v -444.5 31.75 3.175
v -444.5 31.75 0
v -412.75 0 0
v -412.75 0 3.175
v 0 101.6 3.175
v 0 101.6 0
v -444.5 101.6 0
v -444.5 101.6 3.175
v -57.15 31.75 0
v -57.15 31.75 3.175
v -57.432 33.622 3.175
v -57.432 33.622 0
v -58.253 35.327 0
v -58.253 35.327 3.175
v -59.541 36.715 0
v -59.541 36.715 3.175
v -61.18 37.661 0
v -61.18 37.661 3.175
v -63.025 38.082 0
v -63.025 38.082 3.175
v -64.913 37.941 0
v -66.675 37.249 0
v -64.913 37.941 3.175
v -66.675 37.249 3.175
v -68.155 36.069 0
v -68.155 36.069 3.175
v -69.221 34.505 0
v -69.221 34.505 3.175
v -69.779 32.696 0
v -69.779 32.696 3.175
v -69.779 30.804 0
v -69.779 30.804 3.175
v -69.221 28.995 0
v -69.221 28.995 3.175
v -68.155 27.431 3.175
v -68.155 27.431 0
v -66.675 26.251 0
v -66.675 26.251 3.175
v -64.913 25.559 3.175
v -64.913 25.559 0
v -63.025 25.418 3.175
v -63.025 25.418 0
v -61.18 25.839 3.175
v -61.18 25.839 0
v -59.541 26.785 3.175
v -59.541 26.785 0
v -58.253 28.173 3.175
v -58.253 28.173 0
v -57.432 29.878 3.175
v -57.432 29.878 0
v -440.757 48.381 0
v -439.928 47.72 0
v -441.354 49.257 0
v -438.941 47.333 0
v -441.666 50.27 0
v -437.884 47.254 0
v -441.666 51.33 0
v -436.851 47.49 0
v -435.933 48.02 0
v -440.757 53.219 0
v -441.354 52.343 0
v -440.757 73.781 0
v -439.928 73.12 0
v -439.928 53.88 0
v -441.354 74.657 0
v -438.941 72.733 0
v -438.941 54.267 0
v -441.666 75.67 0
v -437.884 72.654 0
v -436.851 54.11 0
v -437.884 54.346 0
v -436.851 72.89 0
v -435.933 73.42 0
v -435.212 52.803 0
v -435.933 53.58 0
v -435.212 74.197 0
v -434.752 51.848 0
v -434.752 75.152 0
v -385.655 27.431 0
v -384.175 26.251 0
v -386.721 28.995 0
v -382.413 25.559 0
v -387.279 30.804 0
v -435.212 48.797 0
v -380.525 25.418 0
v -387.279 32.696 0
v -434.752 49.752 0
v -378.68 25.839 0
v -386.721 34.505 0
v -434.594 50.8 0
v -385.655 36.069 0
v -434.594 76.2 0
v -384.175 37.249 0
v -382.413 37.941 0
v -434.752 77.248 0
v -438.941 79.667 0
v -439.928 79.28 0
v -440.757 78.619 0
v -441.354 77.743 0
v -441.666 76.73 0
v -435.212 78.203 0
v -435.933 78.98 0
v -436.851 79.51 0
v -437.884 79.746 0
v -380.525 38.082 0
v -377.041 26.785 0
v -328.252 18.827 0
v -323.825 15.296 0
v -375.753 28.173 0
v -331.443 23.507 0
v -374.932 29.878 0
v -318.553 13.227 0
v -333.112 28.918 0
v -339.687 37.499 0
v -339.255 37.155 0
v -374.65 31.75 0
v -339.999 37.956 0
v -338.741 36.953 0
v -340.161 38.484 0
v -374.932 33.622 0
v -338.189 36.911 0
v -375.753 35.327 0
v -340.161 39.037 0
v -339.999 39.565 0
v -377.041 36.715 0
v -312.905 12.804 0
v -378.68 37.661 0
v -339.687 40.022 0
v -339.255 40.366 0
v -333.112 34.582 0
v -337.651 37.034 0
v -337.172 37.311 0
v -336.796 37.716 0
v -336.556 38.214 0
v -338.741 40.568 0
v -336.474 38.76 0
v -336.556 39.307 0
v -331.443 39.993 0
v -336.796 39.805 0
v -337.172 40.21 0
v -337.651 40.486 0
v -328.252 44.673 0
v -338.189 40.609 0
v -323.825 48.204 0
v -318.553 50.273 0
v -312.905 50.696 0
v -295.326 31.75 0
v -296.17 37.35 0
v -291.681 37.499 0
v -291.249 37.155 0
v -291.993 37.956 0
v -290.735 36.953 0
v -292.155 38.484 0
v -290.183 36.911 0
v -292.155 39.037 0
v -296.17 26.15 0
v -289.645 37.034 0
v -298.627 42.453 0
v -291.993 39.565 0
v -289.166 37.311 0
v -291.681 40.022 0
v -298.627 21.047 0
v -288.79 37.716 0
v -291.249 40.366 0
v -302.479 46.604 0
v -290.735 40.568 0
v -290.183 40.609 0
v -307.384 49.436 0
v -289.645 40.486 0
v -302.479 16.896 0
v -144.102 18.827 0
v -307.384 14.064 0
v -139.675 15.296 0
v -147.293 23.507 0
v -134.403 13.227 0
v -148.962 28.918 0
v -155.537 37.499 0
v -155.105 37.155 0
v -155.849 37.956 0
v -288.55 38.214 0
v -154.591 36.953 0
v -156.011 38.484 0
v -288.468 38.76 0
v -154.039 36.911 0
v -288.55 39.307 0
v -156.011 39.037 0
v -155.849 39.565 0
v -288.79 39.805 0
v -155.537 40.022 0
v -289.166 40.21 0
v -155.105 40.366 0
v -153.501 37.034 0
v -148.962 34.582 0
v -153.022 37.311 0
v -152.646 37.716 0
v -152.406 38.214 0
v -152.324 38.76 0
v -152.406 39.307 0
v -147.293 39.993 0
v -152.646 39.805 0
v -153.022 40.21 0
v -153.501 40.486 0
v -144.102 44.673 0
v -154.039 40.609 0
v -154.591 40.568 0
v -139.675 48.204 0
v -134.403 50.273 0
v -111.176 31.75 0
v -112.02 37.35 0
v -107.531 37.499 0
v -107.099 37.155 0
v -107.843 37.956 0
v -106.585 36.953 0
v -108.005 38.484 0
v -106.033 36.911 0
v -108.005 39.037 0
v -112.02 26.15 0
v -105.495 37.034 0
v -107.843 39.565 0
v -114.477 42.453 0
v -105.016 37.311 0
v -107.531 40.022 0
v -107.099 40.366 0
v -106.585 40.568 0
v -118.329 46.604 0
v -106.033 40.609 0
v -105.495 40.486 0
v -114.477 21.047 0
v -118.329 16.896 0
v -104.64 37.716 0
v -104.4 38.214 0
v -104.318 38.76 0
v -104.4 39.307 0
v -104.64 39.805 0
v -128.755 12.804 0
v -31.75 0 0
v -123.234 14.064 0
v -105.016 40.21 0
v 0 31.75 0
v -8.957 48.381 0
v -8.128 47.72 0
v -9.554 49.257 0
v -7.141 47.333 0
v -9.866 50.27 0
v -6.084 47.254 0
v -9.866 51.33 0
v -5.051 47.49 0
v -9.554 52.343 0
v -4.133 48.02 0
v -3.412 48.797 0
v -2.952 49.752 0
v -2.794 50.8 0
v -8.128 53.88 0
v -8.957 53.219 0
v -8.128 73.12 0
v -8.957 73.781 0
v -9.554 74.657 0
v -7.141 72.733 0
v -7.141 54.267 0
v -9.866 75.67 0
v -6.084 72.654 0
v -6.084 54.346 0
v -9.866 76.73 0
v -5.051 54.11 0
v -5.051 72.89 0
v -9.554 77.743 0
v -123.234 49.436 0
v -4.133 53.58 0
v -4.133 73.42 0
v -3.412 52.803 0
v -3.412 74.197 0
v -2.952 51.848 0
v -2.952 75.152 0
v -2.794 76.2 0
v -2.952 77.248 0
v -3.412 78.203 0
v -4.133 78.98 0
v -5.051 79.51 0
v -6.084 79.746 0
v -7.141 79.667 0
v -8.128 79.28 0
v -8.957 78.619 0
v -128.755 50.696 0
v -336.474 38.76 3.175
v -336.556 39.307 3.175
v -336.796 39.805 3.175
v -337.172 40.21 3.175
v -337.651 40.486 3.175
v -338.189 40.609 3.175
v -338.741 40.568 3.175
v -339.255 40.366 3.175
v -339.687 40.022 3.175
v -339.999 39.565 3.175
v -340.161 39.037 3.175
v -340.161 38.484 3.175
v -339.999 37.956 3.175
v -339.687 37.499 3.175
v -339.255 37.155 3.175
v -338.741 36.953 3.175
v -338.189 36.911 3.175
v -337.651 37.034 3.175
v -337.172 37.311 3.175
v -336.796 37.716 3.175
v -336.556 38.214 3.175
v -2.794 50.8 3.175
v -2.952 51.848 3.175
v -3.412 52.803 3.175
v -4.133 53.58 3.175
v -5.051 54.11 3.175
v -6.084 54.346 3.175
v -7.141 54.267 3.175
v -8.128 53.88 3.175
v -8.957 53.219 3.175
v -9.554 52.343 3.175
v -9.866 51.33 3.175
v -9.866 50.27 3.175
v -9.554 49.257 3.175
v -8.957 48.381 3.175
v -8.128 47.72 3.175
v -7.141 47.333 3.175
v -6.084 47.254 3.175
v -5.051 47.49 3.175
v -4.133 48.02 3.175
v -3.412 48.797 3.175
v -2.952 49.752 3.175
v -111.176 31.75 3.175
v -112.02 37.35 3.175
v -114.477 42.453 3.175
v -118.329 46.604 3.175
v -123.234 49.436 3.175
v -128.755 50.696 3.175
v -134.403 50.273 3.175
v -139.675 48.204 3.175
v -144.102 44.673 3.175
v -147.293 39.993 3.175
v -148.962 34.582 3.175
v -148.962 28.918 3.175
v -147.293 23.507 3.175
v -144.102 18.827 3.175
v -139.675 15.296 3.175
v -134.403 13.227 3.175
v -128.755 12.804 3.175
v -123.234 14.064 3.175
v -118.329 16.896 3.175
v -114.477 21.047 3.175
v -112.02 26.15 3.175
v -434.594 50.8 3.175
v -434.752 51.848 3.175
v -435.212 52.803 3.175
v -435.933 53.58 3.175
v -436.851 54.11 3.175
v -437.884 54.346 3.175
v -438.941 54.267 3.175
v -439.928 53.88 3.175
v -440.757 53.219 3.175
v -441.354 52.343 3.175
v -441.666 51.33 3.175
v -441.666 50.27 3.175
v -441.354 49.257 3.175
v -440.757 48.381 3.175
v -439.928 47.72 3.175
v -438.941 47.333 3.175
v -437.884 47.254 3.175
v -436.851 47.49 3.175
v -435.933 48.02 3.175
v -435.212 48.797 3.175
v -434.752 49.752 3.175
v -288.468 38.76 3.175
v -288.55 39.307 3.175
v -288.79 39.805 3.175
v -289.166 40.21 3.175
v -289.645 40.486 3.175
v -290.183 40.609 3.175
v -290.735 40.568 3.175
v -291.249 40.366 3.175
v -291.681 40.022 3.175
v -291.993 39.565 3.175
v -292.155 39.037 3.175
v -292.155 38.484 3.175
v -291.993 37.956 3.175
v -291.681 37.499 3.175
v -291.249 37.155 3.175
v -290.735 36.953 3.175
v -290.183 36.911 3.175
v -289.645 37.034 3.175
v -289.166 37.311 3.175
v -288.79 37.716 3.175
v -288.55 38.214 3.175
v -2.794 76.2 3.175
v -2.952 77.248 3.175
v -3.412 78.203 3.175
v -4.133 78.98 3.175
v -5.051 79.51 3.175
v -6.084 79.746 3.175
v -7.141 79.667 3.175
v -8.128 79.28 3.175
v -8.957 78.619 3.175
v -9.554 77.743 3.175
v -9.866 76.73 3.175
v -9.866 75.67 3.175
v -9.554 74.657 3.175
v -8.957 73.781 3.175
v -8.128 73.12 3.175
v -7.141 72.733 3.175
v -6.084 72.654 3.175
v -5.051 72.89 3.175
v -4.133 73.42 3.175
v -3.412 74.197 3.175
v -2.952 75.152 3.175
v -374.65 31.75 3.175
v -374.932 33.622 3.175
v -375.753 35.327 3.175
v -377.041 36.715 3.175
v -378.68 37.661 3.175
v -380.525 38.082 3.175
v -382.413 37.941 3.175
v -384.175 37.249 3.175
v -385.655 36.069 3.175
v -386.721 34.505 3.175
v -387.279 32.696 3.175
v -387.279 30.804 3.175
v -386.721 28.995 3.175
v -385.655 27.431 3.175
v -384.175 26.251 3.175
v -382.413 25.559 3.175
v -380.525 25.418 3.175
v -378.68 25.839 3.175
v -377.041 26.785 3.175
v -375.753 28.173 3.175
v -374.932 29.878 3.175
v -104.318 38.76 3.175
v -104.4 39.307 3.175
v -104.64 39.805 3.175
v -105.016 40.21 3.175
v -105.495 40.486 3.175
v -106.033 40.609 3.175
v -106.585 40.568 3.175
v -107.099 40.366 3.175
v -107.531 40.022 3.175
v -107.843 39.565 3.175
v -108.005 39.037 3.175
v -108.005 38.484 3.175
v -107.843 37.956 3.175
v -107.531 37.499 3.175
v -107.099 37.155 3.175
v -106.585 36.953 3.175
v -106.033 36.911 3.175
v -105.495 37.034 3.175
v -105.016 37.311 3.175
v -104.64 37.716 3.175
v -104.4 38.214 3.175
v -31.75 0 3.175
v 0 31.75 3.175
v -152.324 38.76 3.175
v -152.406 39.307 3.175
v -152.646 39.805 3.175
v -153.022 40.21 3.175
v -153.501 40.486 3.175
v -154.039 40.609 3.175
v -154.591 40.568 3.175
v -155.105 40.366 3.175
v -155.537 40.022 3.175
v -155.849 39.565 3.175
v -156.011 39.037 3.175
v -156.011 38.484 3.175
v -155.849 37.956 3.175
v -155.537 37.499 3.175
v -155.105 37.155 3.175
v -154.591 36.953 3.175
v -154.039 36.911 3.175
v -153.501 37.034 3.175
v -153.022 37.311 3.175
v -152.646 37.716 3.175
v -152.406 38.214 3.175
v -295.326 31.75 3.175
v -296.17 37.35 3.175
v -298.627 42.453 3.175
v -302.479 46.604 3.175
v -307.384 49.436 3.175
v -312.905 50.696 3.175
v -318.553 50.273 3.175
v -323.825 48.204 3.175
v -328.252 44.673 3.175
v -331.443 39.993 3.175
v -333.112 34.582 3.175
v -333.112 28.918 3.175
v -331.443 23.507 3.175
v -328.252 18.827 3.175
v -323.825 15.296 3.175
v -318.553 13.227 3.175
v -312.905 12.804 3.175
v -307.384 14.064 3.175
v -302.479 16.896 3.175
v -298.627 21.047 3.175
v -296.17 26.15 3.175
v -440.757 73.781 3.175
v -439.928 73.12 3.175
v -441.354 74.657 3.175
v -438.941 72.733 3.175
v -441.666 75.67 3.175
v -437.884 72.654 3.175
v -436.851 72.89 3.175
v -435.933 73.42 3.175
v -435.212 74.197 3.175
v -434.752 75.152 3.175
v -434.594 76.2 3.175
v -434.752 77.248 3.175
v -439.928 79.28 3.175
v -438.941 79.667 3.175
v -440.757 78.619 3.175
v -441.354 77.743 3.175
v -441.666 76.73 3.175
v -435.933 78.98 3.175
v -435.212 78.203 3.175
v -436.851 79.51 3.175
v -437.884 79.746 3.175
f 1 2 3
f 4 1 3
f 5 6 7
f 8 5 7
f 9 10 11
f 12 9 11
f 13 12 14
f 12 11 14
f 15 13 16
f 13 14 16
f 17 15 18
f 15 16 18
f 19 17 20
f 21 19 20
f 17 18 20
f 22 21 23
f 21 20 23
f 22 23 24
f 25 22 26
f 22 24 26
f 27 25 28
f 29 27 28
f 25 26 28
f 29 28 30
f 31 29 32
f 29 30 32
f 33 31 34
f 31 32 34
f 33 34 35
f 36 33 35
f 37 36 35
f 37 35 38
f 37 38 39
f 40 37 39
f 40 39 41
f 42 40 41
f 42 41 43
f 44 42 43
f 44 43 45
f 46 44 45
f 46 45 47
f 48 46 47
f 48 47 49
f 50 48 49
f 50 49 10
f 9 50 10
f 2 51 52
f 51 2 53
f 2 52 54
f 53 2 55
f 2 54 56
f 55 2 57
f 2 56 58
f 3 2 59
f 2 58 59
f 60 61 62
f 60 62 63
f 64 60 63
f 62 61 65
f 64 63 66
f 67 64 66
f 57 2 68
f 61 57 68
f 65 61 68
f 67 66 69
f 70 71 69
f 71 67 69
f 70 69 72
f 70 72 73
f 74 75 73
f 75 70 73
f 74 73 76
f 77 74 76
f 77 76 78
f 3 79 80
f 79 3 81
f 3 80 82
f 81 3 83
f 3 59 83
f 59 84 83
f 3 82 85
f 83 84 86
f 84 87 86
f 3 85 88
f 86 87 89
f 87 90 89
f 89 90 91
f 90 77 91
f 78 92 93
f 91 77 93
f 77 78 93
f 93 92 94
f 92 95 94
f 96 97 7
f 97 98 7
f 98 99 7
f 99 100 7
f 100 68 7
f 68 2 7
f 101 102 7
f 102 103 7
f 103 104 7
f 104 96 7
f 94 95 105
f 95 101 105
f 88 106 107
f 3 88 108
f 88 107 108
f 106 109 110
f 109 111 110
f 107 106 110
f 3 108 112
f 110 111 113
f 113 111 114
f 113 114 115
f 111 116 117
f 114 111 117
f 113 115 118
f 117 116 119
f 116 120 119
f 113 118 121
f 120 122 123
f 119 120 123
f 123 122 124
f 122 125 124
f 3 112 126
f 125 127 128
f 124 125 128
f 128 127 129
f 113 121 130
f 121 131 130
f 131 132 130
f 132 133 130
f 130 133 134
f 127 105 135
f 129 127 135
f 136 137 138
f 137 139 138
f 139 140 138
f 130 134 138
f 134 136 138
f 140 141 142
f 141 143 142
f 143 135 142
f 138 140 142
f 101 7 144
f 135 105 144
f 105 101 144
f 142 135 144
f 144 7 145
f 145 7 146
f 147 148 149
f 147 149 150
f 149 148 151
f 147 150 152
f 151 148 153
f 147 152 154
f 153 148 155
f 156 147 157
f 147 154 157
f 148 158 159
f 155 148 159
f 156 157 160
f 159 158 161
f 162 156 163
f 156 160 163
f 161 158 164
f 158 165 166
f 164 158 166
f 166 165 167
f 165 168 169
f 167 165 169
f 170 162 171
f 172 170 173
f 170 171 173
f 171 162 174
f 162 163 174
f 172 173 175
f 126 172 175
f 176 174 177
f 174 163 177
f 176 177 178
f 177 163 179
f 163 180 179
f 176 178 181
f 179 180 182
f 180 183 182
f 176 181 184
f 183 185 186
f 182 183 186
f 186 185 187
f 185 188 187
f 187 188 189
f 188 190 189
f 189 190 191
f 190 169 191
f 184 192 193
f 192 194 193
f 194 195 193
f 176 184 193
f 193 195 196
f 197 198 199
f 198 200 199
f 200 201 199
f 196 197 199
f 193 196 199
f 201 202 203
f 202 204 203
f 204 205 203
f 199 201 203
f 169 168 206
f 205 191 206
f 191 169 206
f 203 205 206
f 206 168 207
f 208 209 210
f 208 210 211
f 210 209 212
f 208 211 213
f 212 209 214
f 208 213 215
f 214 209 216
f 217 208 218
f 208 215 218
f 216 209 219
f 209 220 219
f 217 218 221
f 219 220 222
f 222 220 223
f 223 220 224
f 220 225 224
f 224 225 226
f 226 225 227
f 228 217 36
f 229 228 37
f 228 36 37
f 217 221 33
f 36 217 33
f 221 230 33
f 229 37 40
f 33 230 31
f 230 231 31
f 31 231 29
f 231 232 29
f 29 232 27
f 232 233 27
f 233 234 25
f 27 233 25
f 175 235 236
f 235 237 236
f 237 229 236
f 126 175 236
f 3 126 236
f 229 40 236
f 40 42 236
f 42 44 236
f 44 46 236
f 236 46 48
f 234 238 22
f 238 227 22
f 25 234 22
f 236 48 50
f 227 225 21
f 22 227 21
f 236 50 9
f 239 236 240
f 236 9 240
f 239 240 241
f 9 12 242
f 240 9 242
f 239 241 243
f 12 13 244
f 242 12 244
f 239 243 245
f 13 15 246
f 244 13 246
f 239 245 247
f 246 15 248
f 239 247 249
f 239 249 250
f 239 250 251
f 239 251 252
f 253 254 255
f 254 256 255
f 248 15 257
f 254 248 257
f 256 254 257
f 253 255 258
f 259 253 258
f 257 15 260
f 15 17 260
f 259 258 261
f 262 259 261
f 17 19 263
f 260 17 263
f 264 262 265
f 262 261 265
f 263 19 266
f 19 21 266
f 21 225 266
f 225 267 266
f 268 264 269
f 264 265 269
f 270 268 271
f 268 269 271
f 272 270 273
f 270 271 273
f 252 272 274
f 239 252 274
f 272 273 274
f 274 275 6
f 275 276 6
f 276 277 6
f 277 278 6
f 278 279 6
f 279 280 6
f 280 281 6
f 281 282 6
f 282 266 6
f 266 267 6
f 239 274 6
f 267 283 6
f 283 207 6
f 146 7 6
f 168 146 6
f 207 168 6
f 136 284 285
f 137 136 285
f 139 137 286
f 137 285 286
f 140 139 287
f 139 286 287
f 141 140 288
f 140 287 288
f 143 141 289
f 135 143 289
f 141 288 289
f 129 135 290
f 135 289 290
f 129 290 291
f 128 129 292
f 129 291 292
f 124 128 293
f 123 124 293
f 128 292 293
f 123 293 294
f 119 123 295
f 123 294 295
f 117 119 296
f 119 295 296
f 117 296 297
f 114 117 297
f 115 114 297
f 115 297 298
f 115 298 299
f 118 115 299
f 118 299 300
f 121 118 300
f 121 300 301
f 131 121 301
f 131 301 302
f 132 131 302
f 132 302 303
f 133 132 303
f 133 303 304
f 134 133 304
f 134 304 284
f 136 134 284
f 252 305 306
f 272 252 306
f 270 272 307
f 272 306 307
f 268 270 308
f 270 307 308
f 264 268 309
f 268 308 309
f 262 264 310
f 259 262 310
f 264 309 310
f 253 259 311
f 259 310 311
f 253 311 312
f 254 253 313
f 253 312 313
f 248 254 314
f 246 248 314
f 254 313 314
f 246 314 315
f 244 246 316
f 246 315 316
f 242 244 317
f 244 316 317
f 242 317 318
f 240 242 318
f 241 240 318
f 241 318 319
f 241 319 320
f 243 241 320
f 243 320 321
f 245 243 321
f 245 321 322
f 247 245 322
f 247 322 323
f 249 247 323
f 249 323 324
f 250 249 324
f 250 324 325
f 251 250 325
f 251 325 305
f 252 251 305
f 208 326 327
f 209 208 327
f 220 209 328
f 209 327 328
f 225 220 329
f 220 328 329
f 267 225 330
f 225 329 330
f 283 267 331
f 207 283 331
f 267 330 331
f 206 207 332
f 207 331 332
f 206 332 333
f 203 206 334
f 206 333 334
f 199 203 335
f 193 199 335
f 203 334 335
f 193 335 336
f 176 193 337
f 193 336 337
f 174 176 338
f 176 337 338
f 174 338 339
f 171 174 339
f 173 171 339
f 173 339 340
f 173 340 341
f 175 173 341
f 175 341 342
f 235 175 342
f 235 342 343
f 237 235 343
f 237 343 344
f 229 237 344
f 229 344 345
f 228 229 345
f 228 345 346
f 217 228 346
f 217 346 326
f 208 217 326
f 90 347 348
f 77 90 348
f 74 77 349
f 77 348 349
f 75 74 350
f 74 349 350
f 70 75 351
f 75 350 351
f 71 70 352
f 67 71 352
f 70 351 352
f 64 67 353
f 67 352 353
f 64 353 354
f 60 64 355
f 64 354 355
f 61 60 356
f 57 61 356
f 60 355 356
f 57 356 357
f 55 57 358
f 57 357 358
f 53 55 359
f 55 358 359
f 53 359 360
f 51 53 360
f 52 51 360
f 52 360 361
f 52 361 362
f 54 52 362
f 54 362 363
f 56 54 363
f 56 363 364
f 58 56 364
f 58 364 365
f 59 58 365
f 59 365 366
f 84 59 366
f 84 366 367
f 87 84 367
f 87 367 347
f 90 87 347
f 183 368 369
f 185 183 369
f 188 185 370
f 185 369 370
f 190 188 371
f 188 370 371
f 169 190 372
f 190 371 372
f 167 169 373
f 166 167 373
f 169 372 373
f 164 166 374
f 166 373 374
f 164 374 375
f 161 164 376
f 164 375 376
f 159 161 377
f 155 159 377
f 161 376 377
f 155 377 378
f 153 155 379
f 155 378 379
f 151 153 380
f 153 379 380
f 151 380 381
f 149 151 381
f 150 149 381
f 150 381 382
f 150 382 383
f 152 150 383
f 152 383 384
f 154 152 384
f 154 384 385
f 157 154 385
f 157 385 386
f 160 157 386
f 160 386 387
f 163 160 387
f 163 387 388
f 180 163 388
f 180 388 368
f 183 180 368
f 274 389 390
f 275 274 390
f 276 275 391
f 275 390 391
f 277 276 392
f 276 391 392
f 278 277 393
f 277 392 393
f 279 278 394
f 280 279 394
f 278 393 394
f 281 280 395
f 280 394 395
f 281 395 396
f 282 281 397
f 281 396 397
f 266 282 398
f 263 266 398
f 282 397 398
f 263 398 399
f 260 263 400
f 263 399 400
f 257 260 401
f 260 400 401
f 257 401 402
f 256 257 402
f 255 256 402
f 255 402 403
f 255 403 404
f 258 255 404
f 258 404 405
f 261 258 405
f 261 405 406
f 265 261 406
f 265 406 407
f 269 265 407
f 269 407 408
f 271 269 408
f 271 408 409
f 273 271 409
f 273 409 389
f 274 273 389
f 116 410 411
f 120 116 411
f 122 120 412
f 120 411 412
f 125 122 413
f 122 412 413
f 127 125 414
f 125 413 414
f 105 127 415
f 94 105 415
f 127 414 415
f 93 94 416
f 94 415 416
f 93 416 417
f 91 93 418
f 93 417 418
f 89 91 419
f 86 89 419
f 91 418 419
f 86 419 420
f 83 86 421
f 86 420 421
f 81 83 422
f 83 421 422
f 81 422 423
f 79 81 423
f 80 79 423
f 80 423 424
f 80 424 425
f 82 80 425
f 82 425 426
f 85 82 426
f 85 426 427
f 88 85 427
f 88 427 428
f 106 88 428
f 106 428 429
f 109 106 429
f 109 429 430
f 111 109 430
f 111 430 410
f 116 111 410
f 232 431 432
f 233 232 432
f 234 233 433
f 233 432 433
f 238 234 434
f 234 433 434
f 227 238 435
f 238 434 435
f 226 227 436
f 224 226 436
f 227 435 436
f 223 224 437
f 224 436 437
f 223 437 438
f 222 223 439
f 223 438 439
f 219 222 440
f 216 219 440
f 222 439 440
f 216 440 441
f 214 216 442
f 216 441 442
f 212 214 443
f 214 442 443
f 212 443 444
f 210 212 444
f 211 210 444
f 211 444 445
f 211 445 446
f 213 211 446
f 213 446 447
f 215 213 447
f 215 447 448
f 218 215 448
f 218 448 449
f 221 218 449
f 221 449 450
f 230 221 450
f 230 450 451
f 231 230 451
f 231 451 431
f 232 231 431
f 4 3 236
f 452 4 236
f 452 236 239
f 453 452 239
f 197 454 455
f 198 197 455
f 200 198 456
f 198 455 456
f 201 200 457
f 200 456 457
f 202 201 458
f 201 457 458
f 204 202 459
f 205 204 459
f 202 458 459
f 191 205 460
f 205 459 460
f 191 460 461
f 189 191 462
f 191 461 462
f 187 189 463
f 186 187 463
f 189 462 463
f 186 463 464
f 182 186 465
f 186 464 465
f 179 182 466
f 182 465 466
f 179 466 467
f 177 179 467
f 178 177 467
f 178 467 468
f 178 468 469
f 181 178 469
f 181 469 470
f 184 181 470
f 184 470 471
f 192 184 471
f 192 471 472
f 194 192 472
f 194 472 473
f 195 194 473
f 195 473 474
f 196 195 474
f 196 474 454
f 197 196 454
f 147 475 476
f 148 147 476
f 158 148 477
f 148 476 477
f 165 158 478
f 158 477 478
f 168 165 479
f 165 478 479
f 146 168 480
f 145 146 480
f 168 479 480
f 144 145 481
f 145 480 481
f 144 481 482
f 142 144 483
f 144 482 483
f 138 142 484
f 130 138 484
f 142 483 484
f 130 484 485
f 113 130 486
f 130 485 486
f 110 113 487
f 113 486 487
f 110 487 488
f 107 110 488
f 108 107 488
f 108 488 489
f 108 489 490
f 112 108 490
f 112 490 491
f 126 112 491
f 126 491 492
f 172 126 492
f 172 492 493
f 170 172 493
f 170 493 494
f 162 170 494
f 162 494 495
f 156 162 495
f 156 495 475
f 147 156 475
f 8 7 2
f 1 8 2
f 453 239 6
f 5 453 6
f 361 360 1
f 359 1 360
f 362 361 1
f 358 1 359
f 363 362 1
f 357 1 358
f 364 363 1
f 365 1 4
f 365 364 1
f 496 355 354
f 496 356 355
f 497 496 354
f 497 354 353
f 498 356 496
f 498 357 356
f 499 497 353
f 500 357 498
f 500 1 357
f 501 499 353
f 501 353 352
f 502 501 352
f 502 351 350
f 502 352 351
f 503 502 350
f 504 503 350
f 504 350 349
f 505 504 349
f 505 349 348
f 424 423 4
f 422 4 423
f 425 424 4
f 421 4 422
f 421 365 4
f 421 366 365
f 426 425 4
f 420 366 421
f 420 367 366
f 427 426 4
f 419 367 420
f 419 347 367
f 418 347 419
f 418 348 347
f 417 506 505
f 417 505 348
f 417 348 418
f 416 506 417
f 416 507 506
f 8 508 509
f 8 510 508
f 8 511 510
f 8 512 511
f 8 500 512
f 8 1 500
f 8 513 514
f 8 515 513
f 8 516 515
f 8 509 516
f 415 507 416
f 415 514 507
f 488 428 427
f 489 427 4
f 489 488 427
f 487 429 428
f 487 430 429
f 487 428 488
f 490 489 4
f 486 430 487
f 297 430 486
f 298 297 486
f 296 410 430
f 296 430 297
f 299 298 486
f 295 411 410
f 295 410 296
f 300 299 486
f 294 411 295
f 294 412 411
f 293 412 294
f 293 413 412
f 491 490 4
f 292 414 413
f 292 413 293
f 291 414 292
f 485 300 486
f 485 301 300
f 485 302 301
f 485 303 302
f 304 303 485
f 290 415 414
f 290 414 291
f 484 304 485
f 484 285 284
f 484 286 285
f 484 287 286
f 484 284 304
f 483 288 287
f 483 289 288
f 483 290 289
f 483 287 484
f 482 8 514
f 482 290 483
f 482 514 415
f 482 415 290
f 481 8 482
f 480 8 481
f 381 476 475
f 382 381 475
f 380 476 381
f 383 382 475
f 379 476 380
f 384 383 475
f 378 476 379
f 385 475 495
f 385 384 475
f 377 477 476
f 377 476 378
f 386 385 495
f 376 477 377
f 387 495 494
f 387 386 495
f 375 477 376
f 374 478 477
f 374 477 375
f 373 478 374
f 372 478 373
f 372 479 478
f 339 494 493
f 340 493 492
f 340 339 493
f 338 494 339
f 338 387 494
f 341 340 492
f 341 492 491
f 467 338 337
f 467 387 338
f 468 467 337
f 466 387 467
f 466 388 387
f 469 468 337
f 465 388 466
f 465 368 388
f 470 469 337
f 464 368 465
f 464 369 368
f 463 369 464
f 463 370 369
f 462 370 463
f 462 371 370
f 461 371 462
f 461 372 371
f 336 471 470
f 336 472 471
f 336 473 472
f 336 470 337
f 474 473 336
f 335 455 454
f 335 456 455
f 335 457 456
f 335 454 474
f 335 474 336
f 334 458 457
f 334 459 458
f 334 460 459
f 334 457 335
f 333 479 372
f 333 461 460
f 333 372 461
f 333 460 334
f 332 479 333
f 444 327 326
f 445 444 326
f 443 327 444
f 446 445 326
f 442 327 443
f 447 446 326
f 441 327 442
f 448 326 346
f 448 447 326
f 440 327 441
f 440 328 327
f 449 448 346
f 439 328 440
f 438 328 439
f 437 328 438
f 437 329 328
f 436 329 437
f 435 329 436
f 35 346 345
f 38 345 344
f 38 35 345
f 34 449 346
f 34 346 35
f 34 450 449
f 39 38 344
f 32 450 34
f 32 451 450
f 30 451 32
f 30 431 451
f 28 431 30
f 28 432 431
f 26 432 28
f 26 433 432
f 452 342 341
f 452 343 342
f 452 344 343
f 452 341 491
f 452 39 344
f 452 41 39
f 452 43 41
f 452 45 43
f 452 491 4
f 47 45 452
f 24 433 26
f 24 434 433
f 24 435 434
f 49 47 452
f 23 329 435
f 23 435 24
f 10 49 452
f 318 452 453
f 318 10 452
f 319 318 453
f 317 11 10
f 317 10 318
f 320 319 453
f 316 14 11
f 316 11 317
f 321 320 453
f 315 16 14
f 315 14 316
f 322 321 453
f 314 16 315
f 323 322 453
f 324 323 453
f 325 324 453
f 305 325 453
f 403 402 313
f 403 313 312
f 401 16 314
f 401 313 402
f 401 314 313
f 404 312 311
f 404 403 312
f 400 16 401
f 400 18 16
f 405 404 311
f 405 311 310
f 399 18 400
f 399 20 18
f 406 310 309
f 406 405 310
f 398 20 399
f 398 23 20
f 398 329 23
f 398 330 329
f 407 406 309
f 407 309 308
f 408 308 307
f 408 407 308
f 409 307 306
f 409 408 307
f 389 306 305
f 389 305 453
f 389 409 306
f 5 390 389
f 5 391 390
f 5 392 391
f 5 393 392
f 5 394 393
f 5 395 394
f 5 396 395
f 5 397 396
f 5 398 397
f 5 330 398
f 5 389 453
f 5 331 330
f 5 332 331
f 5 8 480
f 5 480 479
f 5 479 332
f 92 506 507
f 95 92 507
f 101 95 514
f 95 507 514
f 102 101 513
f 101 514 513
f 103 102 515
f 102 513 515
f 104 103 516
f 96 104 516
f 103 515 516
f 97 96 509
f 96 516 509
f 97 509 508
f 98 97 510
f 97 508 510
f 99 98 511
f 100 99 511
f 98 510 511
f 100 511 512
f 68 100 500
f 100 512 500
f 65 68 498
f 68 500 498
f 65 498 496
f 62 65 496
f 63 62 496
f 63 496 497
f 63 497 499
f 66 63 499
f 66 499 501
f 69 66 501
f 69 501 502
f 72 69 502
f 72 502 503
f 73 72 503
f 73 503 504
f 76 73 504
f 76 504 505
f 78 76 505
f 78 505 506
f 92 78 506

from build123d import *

# Parameters (mm, degrees)
F1_DEPTH  = 3.175
F2_R      = 3.556
F3_DEPTH  = 25.4
F4_DEPTH  = 25.4
F2_R_2    = 6.35
F5_DEPTH  = 25.4
F6_DEPTH  = 25.4
F7_DEPTH  = 25.4
F8_DEPTH  = 25.4
F9_R      = 18.9992
F9_R_2    = 1.8542
F10_DEPTH = 25.4


with BuildPart() as f1:
    # F0 (on Top) → F1 (new body)
    with BuildSketch(Plane.XY):
        Polygon((0, 31.75), (0, 101.6), (-444.5, 101.6), (-444.5, 31.75), (-412.75, 0), (-31.75, 0), align=None)
    extrude(amount=F1_DEPTH)

    # F2 (on face) → F3 (cut)
    with BuildSketch(Plane.XY.offset(3.175)):
        with Locations((-438.15, 50.8)):
            Circle(F2_R)
    extrude(amount=-F3_DEPTH, mode=Mode.SUBTRACT)

    # F2 (on face) → F4 (cut)
    with BuildSketch(Plane.XY.offset(3.175)):
        with Locations((-438.15, 76.2)):
            Circle(F2_R)
    extrude(amount=-F4_DEPTH, mode=Mode.SUBTRACT)

    # F2 (on face) → F5 (cut)
    with BuildSketch(Plane.XY.offset(3.175)):
        with Locations((-381, 31.75)):
            Circle(F2_R_2)
    extrude(amount=-F5_DEPTH, mode=Mode.SUBTRACT)

    # F2 (on face) → F6 (cut)
    with BuildSketch(Plane.XY.offset(3.175)):
        with Locations((-63.5, 31.75)):
            Circle(F2_R_2)
    extrude(amount=-F6_DEPTH, mode=Mode.SUBTRACT)

    # F2 (on face) → F7 (cut)
    with BuildSketch(Plane.XY.offset(3.175)):
        with Locations((-6.35, 76.2)):
            Circle(F2_R)
    extrude(amount=-F7_DEPTH, mode=Mode.SUBTRACT)

    # F2 (on face) → F8 (cut)
    with BuildSketch(Plane.XY.offset(3.175)):
        with Locations((-6.35, 50.8)):
            Circle(F2_R)
    extrude(amount=-F8_DEPTH, mode=Mode.SUBTRACT)

    # F9 (on face) → F10 (cut)
    with BuildSketch(Plane.XY.offset(3.175)):
        with Locations((-314.325, 31.75)):
            Circle(F9_R)
        with Locations((-338.328, 38.7604)):
            Circle(F9_R_2)
        with Locations((-290.322, 38.7604)):
            Circle(F9_R_2)
        with Locations((-130.175, 31.75)):
            Circle(F9_R)
        with Locations((-154.178, 38.7604)):
            Circle(F9_R_2)
        with Locations((-106.172, 38.7604)):
            Circle(F9_R_2)
    extrude(amount=-F10_DEPTH, mode=Mode.SUBTRACT)


solid = f1.part
